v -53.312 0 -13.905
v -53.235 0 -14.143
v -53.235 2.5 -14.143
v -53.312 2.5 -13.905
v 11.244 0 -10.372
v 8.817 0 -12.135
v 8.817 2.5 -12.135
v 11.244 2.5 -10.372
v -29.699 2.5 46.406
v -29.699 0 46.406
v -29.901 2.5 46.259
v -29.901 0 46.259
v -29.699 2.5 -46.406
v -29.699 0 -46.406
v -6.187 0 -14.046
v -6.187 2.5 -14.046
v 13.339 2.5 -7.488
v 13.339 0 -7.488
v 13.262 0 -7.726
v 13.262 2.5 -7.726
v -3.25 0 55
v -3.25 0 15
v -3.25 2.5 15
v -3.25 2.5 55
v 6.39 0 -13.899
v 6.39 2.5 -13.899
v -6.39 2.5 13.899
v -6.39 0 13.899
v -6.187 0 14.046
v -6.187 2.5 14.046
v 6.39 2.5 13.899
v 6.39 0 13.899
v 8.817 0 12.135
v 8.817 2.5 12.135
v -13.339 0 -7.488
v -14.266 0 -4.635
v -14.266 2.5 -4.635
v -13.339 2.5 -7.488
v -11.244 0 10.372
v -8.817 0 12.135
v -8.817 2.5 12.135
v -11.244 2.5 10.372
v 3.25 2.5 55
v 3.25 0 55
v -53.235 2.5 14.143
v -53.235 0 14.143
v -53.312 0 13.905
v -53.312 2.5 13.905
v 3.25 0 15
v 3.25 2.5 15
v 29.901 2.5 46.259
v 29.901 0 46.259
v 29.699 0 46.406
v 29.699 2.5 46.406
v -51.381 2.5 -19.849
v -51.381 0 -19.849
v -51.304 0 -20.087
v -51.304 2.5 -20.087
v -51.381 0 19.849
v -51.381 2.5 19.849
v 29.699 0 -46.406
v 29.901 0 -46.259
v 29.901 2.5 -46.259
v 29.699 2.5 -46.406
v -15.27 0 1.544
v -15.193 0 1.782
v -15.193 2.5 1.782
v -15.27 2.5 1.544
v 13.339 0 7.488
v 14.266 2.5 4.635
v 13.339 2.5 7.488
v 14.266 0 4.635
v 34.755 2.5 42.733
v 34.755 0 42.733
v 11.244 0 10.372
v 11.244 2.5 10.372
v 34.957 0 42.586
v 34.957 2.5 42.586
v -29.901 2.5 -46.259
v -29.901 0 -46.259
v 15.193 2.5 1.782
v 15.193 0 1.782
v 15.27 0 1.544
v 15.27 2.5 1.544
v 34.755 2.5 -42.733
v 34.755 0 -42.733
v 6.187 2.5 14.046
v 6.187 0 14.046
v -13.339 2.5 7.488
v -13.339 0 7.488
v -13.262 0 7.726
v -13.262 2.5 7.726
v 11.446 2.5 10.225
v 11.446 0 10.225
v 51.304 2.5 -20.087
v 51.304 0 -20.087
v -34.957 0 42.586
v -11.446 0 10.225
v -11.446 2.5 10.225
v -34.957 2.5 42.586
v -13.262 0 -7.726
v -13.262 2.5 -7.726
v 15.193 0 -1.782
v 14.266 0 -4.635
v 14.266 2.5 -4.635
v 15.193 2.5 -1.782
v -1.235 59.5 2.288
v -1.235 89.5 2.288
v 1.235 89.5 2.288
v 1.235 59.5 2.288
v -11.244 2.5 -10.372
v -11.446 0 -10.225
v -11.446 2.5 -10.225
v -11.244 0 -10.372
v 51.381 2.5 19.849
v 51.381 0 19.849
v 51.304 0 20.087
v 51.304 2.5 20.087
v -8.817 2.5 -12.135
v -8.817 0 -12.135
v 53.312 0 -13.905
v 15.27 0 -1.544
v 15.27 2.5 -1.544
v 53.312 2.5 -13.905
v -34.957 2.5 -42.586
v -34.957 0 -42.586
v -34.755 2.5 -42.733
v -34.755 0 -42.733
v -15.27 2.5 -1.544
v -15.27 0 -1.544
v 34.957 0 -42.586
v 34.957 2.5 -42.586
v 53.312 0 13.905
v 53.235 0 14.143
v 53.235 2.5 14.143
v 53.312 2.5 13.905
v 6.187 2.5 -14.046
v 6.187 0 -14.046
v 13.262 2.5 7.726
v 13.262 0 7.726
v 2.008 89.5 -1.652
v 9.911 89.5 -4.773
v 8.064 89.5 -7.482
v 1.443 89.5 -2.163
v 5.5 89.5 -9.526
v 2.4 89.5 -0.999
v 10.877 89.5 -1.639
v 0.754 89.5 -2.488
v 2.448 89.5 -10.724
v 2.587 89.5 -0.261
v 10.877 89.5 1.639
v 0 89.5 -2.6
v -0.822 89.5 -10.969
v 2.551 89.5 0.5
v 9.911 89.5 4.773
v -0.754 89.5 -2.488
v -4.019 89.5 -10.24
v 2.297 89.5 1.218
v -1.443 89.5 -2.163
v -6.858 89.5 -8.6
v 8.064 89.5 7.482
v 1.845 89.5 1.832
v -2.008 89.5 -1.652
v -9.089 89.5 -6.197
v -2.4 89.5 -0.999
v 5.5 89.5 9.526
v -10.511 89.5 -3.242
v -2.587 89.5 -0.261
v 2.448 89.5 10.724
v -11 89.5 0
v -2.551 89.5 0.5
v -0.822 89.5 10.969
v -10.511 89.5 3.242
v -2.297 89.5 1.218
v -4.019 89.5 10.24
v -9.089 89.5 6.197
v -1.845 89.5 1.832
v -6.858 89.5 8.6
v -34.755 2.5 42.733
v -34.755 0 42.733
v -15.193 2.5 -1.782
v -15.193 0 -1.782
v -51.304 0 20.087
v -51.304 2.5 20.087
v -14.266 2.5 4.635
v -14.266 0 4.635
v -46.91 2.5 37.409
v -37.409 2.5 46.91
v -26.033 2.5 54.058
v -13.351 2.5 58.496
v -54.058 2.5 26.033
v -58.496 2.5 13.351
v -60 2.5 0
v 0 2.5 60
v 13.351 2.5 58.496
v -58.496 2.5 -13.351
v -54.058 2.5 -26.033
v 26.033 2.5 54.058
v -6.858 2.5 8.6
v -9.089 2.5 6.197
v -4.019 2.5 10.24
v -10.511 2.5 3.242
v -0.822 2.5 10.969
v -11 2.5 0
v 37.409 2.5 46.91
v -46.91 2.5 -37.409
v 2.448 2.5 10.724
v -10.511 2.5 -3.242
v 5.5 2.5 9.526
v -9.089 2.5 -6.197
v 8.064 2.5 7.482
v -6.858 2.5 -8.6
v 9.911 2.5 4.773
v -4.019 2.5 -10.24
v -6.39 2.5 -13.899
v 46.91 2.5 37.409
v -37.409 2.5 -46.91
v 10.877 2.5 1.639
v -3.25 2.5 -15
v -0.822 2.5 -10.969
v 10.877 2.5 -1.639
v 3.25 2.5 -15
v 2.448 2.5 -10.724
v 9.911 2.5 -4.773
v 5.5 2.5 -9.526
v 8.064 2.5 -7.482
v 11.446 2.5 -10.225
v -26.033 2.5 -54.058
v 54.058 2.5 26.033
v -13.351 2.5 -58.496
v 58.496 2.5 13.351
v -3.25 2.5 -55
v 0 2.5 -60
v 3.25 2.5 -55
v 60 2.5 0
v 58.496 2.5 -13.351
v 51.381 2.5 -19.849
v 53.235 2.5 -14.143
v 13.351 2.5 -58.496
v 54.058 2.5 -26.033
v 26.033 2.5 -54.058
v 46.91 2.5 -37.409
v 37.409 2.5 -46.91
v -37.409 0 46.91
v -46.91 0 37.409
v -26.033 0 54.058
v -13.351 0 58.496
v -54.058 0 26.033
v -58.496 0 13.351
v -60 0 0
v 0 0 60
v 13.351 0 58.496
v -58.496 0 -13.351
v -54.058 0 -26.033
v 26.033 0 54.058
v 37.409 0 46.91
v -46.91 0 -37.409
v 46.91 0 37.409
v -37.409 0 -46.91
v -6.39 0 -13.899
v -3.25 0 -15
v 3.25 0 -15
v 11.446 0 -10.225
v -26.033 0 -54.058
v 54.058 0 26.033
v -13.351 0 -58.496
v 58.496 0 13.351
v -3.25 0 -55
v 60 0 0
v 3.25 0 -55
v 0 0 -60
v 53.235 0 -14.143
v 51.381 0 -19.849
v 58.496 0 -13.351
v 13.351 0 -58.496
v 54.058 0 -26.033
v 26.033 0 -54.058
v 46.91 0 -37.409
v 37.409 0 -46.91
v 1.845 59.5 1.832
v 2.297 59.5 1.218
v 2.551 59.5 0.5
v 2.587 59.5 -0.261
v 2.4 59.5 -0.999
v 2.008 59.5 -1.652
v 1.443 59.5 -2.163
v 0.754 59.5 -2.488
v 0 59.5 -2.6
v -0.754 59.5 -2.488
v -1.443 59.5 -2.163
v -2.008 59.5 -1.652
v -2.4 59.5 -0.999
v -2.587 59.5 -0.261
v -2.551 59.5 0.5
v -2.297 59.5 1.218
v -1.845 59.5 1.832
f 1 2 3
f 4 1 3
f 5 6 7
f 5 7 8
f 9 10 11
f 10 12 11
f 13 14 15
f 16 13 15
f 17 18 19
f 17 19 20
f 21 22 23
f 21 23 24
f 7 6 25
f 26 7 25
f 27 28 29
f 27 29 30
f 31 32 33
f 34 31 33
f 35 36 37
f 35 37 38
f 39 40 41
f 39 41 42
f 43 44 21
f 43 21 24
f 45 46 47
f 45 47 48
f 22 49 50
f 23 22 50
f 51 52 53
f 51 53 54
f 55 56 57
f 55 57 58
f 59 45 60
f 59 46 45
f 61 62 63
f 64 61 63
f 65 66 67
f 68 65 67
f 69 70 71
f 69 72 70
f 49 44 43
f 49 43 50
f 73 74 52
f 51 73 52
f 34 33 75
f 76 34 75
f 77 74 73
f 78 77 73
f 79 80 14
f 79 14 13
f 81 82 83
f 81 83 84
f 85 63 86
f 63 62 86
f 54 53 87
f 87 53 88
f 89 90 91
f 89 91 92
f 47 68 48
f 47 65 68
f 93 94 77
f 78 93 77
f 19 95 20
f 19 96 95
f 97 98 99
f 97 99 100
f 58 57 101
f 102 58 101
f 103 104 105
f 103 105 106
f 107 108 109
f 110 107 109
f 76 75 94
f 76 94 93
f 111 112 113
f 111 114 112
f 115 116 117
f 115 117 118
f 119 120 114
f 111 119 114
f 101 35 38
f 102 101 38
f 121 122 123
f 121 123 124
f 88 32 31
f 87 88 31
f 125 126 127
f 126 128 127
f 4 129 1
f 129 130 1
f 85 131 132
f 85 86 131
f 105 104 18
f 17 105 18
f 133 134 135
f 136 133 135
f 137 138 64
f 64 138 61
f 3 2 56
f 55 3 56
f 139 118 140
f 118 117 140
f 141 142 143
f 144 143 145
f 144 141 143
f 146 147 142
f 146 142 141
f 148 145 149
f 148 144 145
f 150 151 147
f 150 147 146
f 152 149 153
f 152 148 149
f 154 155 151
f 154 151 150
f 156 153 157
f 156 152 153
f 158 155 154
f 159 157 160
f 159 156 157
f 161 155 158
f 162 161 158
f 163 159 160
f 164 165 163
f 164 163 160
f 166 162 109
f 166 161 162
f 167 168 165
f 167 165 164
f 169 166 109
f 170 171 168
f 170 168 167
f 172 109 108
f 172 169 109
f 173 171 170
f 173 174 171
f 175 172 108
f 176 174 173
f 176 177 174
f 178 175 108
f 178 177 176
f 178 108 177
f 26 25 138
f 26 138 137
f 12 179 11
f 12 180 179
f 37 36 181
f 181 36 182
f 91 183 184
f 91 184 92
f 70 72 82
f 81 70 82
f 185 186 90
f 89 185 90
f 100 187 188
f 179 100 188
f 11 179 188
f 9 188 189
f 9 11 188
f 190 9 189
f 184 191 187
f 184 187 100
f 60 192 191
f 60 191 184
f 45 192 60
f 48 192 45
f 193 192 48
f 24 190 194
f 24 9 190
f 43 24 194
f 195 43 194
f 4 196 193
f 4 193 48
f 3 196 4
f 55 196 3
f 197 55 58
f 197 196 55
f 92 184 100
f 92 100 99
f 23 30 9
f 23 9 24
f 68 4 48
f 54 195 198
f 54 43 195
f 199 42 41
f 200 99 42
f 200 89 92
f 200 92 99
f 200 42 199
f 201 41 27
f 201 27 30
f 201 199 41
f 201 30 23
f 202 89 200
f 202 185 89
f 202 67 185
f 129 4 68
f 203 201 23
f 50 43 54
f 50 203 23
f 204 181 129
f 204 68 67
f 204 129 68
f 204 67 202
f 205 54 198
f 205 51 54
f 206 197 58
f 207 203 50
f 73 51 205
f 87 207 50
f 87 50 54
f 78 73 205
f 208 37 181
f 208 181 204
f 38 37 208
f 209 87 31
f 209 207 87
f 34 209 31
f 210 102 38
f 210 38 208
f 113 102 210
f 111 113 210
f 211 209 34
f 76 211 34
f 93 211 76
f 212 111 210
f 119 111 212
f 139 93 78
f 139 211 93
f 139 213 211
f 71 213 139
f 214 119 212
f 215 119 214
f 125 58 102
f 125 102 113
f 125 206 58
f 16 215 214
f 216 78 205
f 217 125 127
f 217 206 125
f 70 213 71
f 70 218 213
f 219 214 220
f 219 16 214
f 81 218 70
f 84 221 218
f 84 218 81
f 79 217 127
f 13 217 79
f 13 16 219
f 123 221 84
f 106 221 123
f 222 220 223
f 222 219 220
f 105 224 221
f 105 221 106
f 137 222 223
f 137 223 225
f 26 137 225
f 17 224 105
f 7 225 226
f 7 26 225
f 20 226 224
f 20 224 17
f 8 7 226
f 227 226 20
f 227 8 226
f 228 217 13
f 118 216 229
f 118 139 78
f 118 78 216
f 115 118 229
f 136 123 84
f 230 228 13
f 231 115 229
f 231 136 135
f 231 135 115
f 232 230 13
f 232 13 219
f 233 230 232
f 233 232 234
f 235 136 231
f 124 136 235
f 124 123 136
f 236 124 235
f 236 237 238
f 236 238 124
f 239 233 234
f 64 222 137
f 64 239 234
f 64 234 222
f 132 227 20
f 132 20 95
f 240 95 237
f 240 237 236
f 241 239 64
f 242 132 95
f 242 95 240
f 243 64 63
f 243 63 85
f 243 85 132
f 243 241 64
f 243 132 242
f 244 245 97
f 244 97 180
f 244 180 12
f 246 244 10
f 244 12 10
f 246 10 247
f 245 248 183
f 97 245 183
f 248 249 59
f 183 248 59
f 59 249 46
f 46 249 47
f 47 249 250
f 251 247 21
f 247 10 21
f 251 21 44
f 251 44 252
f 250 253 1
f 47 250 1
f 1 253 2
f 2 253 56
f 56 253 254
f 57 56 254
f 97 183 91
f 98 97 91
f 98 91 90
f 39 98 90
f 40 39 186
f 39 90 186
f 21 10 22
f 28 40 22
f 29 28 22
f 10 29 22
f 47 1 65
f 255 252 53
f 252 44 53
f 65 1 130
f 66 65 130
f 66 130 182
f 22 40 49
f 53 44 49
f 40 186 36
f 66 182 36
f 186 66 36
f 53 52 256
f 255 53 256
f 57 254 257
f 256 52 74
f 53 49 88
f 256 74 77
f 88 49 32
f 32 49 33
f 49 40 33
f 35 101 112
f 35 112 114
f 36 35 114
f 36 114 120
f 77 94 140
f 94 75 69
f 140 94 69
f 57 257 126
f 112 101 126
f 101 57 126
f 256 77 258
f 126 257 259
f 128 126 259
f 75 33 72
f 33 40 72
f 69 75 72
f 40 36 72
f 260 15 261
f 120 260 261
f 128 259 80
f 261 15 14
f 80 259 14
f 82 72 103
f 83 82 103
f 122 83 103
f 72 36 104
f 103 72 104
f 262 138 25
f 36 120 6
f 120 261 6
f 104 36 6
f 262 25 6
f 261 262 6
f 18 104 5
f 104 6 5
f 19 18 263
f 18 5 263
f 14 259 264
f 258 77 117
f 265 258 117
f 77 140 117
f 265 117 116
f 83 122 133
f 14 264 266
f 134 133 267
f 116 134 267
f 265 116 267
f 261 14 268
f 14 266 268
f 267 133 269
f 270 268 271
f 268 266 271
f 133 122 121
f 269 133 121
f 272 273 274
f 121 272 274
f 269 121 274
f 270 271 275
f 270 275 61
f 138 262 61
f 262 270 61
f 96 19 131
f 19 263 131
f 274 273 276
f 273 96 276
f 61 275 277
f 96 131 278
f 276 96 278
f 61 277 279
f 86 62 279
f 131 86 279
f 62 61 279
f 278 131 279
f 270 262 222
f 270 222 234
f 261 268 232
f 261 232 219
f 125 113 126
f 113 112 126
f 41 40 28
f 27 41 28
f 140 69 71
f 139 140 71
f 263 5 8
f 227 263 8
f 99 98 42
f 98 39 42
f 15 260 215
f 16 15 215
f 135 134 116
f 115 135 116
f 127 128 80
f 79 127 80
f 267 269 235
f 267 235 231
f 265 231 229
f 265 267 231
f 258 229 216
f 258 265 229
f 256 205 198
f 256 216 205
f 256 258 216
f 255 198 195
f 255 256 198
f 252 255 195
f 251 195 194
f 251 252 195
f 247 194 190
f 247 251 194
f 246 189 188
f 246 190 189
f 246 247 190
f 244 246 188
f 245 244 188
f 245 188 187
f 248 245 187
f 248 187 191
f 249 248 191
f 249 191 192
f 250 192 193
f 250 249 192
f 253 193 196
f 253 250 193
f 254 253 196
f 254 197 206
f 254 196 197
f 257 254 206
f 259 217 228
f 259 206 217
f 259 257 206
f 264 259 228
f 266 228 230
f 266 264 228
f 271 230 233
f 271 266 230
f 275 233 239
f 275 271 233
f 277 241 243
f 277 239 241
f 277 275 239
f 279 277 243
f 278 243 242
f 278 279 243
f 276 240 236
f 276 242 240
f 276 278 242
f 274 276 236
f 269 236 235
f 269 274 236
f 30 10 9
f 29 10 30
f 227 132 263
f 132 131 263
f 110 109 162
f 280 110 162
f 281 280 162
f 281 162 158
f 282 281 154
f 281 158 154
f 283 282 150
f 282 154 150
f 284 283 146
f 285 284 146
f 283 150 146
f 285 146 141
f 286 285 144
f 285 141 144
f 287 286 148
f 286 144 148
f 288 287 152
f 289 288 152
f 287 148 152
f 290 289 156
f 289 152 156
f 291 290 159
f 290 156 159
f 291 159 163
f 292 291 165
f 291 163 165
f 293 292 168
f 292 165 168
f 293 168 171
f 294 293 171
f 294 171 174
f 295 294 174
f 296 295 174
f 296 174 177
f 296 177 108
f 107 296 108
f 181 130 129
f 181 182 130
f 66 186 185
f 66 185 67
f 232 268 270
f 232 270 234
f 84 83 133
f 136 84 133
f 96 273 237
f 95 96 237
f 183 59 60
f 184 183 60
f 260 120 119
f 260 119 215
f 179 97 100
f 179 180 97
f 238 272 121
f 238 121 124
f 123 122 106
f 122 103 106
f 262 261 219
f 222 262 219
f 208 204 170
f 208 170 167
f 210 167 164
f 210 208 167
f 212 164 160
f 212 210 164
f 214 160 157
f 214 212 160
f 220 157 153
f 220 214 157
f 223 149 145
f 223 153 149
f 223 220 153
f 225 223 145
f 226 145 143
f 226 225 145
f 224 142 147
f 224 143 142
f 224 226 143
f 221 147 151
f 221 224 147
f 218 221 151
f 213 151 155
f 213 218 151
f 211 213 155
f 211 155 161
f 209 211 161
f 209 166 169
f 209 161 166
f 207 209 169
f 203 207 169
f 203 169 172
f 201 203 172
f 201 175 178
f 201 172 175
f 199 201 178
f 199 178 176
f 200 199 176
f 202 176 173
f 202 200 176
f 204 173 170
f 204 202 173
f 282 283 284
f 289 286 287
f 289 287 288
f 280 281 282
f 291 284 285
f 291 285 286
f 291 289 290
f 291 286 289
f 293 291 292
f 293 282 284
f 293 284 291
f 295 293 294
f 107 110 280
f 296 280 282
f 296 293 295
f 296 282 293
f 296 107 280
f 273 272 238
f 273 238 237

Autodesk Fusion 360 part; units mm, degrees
sketch "Sketch1" plane through (0, 0, 0) normal (0, 1, 0) x (1, 0, 0)
  line L0 (-3, 15) -> (3, 15)
  line L1 (3, 15) -> (3, 55)
  line L2 (3, 55) -> (-3, 55)
  line L3 (-3, 55) -> (-3, 15)
  line L4 (8.8168, 12.1353) -> (11.2438, 10.3719)
  line L5 (8.8168, 12.1353) -> (6.3897, 13.8986)
  line L6 (6.3897, 13.8986) -> (29.9011, 46.2593)
  line L7 (29.9011, 46.2593) -> (34.7552, 42.7326)
  line L8 (34.7552, 42.7326) -> (11.2438, 10.3719)
  line L9 (14.2658, 4.6353) -> (13.3388, 7.4884)
  line L10 (13.3388, 7.4884) -> (15.1929, 1.7821)
  line L11 (15.1929, 1.7821) -> (53.2352, 14.1428)
  line L12 (53.2352, 14.1428) -> (51.3811, 19.8491)
  line L13 (51.3811, 19.8491) -> (13.3388, 7.4884)
  line L14 (14.2658, -4.6353) -> (13.3388, -7.4884)
  line L15 (13.3388, -7.4884) -> (15.1929, -1.7821)
  line L16 (15.1929, -1.7821) -> (53.2352, -14.1428)
  line L17 (53.2352, -14.1428) -> (51.3811, -19.8491)
  line L18 (51.3811, -19.8491) -> (13.3388, -7.4884)
  line L19 (8.8168, -12.1353) -> (11.2438, -10.3719)
  line L20 (11.2438, -10.3719) -> (34.7552, -42.7326)
  line L21 (34.7552, -42.7326) -> (29.9011, -46.2593)
  line L22 (29.9011, -46.2593) -> (6.3897, -13.8986)
  line L23 (6.3897, -13.8986) -> (8.8168, -12.1353)
  line L24 (0, -15) -> (3, -15)
  line L25 (3, -15) -> (-3, -15)
  line L26 (-3, -15) -> (-3, -55)
  line L27 (-3, -55) -> (3, -55)
  line L28 (3, -55) -> (3, -15)
  line L29 (-8.8168, -12.1353) -> (-6.3897, -13.8986)
  line L30 (-6.3897, -13.8986) -> (-11.2438, -10.3719)
  line L31 (-11.2438, -10.3719) -> (-34.7552, -42.7326)
  line L32 (-34.7552, -42.7326) -> (-29.9011, -46.2593)
  line L33 (-29.9011, -46.2593) -> (-6.3897, -13.8986)
  line L34 (-14.2658, -4.6353) -> (-13.3388, -7.4884)
  line L35 (-13.3388, -7.4884) -> (-15.1929, -1.7821)
  line L36 (-15.1929, -1.7821) -> (-53.2352, -14.1428)
  line L37 (-53.2352, -14.1428) -> (-51.3811, -19.8491)
  line L38 (-51.3811, -19.8491) -> (-13.3388, -7.4884)
  line L39 (-14.2658, 4.6353) -> (-13.3388, 7.4884)
  line L40 (-13.3388, 7.4884) -> (-15.1929, 1.7821)
  line L41 (-15.1929, 1.7821) -> (-53.2352, 14.1428)
  line L42 (-53.2352, 14.1428) -> (-51.3811, 19.8491)
  line L43 (-51.3811, 19.8491) -> (-13.3388, 7.4884)
  line L44 (-8.8168, 12.1353) -> (-6.3897, 13.8986)
  line L45 (-6.3897, 13.8986) -> (-11.2438, 10.3719)
  line L46 (-11.2438, 10.3719) -> (-34.7552, 42.7326)
  line L47 (-34.7552, 42.7326) -> (-29.9011, 46.2593)
  line L48 (-29.9011, 46.2593) -> (-6.3897, 13.8986)
  circle A0 centre (0, 0) radius 60
  dimension "d20" = 15
  dimension "d21" = 15
  dimension "d22" = 15
  dimension "d23" = 15
  dimension "d24" = 15
  dimension "d25" = 15
  dimension "d26" = 15
  dimension "d27" = 15
  dimension "d28" = 15
  dimension "d29" = 40
  dimension "d30" = 6
  dimension "d31" = 40
  dimension "d32" = 3
  dimension "d33" = 3
  dimension "d34" = 40
  dimension "d35" = 6
  dimension "d36" = 3
  dimension "d37" = 6
  dimension "d38" = 40
  dimension "d39" = 6
  dimension "d40" = 3
  dimension "d41" = 40
  dimension "d42" = 6
  dimension "d43" = 3
  dimension "d44" = 40
  dimension "d45" = 6
  dimension "d46" = 40
  dimension "d47" = 3
  dimension "d48" = 6
  dimension "d49" = 40
  dimension "d50" = 6
  dimension "d51" = 3
  dimension "d52" = 6
  dimension "d53" = 40
  dimension "d54" = 6
  dimension "d55" = 3
  dimension "d56" = 6
  dimension "d57" = 40
  dimension "d58" = 6
  dimension "d59" = 3
  dimension "d60" = 6
  dimension "d61" = 40
  dimension "d62" = 6
  dimension "d63" = 3
  dimension "d64" = 6
  dimension "d65" = 40
  dimension "d66" = 6
extrude "Extrude1" add sketch "Sketch1" along normal blind 2.5
sketch "Sketch2" plane through (0, 2.5, 0) normal (0, 1, 0) x (-1, 0, 0)
  line L0 (-11.2438, -10.3719) -> (-6.3897, -13.8986)
  line L1 (-6.3897, -13.8986) -> (-29.9011, -46.2593)
  line L2 (-29.9011, -46.2593) -> (-34.7552, -42.7326)
  line L3 (-34.7552, -42.7326) -> (-11.2438, -10.3719)
  line L4 (-29.9011, 46.2593) -> (-6.3897, 13.8986)
  line L5 (-6.3897, 13.8986) -> (-11.2438, 10.3719)
  line L6 (-11.2438, 10.3719) -> (-34.7552, 42.7326)
  line L7 (-34.7552, 42.7326) -> (-29.9011, 46.2593)
  line L8 (-3, 15) -> (-3, 55)
  line L9 (-3, 55) -> (3, 55)
  line L10 (3, 55) -> (3, 15)
  line L11 (3, 15) -> (-3, 15)
  line L12 (34.7552, -42.7326) -> (29.9011, -46.2593)
  line L13 (29.9011, -46.2593) -> (6.3897, -13.8986)
  line L14 (6.3897, -13.8986) -> (11.2438, -10.3719)
  line L15 (11.2438, -10.3719) -> (34.7552, -42.7326)
  line L16 (3, -15) -> (3, -55)
  line L17 (3, -55) -> (-3, -55)
  line L18 (-3, -55) -> (-3, -15)
  line L19 (-3, -15) -> (3, -15)
  line L20 (13.3388, 7.4884) -> (51.3811, 19.8491)
  line L21 (51.3811, 19.8491) -> (53.2352, 14.1428)
  line L22 (53.2352, 14.1428) -> (15.1929, 1.7821)
  line L23 (15.1929, 1.7821) -> (13.3388, 7.4884)
  line L24 (-13.3388, -7.4884) -> (-51.3811, -19.8491)
  line L25 (-51.3811, -19.8491) -> (-53.2352, -14.1428)
  line L26 (-53.2352, -14.1428) -> (-15.1929, -1.7821)
  line L27 (-15.1929, -1.7821) -> (-13.3388, -7.4884)
  line L28 (6.3897, 13.8986) -> (29.9011, 46.2593)
  line L29 (29.9011, 46.2593) -> (34.7552, 42.7326)
  line L30 (34.7552, 42.7326) -> (11.2438, 10.3719)
  line L31 (11.2438, 10.3719) -> (6.3897, 13.8986)
  line L32 (-53.2352, 14.1428) -> (-51.3811, 19.8491)
  line L33 (-51.3811, 19.8491) -> (-13.3388, 7.4884)
  line L34 (-13.3388, 7.4884) -> (-15.1929, 1.7821)
  line L35 (-15.1929, 1.7821) -> (-53.2352, 14.1428)
  line L36 (53.2352, -14.1428) -> (51.3811, -19.8491)
  line L37 (51.3811, -19.8491) -> (13.3388, -7.4884)
  line L38 (13.3388, -7.4884) -> (15.1929, -1.7821)
  line L39 (15.1929, -1.7821) -> (53.2352, -14.1428)
  circle A0 centre (0, 0) radius 60
  circle A1 centre (0, 0) radius 11
  dimension "d69" = 22
extrude "Extrude2" add sketch "Sketch2" along normal blind 87 contours A1
sketch "Sketch3" plane through (0, 89.5, 0) normal (0, 1, 0) x (-1, 0, 0)
  circle A0 centre (0, 0) radius 11
  arc A1 (-1.2349, 2.288) -> (1.2349, 2.288) centre (0, 0) ccw
  line L0 (1.2349, 2.288) -> (-1.2349, 2.288)
extrude "Extrude3" cut sketch "Sketch3" against normal blind 30 contours A1 L0
extrude "Extrude4" cut 1 faces at (14.2269, 0.8333, -24.6855) along direction (-0.809017, 0, -0.587785) blind 0.25
extrude "Extrude5" cut 1 faces at (-3, 0.8333, -41.6667) along direction (-1, 0, 0) blind 0.25
extrude "Extrude6" cut 1 faces at (-19.081, 0.8333, -21.1588) along direction (-0.809017, 0, 0.587785) blind 0.25
extrude "Extrude7" cut 1 faces at (-27.8737, 0.8333, -5.9023) along direction (-0.309017, 0, 0.951057) blind 0.25
extrude "Extrude8" cut 1 faces at (-38.7003, 0.8333, 15.7289) along direction (0.309017, 0, 0.951057) blind 0.25
extrude "Extrude9" cut 1 faces at (-22.064, 0.8333, 35.4724) along direction (0.809017, 0, 0.587785) blind 0.25
extrude "Extrude10" cut 1 faces at (3, 0.8333, 41.6667) along direction (1, 0, 0) blind 0.25
extrude "Extrude11" cut 1 faces at (19.081, 0.8333, 21.1588) along direction (0.809017, 0, -0.587785) blind 0.25
extrude "Extrude12" cut 1 faces at (27.8737, 0.8333, 5.9023) along direction (0.309017, 0, -0.951057) blind 0.25
extrude "Extrude13" cut 1 faces at (38.7003, 0.8333, -15.7289) along direction (-0.309017, 0, -0.951057) blind 0.25
extrude "Extrude14" cut 1 faces at (27.8737, 0.8333, -5.9023) along direction (0.309017, 0, 0.951057) blind 0.25
extrude "Extrude15" cut 1 faces at (38.7003, 0.8333, 15.7289) along direction (-0.309017, 0, 0.951057) blind 0.25
extrude "Extrude16" cut 1 faces at (22.064, 0.8333, 35.4724) along direction (-0.809017, 0, 0.587785) blind 0.25
extrude "Extrude17" cut 1 faces at (-3, 0.8333, 28.3333) along direction (-1, 0, 0) blind 0.25
extrude "Extrude18" cut 1 faces at (-19.081, 0.8333, 21.1588) along direction (-0.809017, 0, -0.587785) blind 0.25
extrude "Extrude19" cut 1 faces at (-27.8737, 0.8333, 5.9023) along direction (-0.309017, 0, -0.951057) blind 0.25
extrude "Extrude20" cut 1 faces at (-38.7003, 0.8333, -15.7289) along direction (0.309017, 0, -0.951057) blind 0.25
extrude "Extrude21" cut 1 faces at (-22.064, 0.8333, -35.4724) along direction (0.809017, 0, -0.587785) blind 0.25
extrude "Extrude22" cut 1 faces at (3, 0.8333, -28.3333) along direction (1, 0, 0) blind 0.25
extrude "Extrude23" cut 1 faces at (26.9181, 0.8333, -31.9457) along direction (0.809017, 0, 0.587785) blind 0.25
